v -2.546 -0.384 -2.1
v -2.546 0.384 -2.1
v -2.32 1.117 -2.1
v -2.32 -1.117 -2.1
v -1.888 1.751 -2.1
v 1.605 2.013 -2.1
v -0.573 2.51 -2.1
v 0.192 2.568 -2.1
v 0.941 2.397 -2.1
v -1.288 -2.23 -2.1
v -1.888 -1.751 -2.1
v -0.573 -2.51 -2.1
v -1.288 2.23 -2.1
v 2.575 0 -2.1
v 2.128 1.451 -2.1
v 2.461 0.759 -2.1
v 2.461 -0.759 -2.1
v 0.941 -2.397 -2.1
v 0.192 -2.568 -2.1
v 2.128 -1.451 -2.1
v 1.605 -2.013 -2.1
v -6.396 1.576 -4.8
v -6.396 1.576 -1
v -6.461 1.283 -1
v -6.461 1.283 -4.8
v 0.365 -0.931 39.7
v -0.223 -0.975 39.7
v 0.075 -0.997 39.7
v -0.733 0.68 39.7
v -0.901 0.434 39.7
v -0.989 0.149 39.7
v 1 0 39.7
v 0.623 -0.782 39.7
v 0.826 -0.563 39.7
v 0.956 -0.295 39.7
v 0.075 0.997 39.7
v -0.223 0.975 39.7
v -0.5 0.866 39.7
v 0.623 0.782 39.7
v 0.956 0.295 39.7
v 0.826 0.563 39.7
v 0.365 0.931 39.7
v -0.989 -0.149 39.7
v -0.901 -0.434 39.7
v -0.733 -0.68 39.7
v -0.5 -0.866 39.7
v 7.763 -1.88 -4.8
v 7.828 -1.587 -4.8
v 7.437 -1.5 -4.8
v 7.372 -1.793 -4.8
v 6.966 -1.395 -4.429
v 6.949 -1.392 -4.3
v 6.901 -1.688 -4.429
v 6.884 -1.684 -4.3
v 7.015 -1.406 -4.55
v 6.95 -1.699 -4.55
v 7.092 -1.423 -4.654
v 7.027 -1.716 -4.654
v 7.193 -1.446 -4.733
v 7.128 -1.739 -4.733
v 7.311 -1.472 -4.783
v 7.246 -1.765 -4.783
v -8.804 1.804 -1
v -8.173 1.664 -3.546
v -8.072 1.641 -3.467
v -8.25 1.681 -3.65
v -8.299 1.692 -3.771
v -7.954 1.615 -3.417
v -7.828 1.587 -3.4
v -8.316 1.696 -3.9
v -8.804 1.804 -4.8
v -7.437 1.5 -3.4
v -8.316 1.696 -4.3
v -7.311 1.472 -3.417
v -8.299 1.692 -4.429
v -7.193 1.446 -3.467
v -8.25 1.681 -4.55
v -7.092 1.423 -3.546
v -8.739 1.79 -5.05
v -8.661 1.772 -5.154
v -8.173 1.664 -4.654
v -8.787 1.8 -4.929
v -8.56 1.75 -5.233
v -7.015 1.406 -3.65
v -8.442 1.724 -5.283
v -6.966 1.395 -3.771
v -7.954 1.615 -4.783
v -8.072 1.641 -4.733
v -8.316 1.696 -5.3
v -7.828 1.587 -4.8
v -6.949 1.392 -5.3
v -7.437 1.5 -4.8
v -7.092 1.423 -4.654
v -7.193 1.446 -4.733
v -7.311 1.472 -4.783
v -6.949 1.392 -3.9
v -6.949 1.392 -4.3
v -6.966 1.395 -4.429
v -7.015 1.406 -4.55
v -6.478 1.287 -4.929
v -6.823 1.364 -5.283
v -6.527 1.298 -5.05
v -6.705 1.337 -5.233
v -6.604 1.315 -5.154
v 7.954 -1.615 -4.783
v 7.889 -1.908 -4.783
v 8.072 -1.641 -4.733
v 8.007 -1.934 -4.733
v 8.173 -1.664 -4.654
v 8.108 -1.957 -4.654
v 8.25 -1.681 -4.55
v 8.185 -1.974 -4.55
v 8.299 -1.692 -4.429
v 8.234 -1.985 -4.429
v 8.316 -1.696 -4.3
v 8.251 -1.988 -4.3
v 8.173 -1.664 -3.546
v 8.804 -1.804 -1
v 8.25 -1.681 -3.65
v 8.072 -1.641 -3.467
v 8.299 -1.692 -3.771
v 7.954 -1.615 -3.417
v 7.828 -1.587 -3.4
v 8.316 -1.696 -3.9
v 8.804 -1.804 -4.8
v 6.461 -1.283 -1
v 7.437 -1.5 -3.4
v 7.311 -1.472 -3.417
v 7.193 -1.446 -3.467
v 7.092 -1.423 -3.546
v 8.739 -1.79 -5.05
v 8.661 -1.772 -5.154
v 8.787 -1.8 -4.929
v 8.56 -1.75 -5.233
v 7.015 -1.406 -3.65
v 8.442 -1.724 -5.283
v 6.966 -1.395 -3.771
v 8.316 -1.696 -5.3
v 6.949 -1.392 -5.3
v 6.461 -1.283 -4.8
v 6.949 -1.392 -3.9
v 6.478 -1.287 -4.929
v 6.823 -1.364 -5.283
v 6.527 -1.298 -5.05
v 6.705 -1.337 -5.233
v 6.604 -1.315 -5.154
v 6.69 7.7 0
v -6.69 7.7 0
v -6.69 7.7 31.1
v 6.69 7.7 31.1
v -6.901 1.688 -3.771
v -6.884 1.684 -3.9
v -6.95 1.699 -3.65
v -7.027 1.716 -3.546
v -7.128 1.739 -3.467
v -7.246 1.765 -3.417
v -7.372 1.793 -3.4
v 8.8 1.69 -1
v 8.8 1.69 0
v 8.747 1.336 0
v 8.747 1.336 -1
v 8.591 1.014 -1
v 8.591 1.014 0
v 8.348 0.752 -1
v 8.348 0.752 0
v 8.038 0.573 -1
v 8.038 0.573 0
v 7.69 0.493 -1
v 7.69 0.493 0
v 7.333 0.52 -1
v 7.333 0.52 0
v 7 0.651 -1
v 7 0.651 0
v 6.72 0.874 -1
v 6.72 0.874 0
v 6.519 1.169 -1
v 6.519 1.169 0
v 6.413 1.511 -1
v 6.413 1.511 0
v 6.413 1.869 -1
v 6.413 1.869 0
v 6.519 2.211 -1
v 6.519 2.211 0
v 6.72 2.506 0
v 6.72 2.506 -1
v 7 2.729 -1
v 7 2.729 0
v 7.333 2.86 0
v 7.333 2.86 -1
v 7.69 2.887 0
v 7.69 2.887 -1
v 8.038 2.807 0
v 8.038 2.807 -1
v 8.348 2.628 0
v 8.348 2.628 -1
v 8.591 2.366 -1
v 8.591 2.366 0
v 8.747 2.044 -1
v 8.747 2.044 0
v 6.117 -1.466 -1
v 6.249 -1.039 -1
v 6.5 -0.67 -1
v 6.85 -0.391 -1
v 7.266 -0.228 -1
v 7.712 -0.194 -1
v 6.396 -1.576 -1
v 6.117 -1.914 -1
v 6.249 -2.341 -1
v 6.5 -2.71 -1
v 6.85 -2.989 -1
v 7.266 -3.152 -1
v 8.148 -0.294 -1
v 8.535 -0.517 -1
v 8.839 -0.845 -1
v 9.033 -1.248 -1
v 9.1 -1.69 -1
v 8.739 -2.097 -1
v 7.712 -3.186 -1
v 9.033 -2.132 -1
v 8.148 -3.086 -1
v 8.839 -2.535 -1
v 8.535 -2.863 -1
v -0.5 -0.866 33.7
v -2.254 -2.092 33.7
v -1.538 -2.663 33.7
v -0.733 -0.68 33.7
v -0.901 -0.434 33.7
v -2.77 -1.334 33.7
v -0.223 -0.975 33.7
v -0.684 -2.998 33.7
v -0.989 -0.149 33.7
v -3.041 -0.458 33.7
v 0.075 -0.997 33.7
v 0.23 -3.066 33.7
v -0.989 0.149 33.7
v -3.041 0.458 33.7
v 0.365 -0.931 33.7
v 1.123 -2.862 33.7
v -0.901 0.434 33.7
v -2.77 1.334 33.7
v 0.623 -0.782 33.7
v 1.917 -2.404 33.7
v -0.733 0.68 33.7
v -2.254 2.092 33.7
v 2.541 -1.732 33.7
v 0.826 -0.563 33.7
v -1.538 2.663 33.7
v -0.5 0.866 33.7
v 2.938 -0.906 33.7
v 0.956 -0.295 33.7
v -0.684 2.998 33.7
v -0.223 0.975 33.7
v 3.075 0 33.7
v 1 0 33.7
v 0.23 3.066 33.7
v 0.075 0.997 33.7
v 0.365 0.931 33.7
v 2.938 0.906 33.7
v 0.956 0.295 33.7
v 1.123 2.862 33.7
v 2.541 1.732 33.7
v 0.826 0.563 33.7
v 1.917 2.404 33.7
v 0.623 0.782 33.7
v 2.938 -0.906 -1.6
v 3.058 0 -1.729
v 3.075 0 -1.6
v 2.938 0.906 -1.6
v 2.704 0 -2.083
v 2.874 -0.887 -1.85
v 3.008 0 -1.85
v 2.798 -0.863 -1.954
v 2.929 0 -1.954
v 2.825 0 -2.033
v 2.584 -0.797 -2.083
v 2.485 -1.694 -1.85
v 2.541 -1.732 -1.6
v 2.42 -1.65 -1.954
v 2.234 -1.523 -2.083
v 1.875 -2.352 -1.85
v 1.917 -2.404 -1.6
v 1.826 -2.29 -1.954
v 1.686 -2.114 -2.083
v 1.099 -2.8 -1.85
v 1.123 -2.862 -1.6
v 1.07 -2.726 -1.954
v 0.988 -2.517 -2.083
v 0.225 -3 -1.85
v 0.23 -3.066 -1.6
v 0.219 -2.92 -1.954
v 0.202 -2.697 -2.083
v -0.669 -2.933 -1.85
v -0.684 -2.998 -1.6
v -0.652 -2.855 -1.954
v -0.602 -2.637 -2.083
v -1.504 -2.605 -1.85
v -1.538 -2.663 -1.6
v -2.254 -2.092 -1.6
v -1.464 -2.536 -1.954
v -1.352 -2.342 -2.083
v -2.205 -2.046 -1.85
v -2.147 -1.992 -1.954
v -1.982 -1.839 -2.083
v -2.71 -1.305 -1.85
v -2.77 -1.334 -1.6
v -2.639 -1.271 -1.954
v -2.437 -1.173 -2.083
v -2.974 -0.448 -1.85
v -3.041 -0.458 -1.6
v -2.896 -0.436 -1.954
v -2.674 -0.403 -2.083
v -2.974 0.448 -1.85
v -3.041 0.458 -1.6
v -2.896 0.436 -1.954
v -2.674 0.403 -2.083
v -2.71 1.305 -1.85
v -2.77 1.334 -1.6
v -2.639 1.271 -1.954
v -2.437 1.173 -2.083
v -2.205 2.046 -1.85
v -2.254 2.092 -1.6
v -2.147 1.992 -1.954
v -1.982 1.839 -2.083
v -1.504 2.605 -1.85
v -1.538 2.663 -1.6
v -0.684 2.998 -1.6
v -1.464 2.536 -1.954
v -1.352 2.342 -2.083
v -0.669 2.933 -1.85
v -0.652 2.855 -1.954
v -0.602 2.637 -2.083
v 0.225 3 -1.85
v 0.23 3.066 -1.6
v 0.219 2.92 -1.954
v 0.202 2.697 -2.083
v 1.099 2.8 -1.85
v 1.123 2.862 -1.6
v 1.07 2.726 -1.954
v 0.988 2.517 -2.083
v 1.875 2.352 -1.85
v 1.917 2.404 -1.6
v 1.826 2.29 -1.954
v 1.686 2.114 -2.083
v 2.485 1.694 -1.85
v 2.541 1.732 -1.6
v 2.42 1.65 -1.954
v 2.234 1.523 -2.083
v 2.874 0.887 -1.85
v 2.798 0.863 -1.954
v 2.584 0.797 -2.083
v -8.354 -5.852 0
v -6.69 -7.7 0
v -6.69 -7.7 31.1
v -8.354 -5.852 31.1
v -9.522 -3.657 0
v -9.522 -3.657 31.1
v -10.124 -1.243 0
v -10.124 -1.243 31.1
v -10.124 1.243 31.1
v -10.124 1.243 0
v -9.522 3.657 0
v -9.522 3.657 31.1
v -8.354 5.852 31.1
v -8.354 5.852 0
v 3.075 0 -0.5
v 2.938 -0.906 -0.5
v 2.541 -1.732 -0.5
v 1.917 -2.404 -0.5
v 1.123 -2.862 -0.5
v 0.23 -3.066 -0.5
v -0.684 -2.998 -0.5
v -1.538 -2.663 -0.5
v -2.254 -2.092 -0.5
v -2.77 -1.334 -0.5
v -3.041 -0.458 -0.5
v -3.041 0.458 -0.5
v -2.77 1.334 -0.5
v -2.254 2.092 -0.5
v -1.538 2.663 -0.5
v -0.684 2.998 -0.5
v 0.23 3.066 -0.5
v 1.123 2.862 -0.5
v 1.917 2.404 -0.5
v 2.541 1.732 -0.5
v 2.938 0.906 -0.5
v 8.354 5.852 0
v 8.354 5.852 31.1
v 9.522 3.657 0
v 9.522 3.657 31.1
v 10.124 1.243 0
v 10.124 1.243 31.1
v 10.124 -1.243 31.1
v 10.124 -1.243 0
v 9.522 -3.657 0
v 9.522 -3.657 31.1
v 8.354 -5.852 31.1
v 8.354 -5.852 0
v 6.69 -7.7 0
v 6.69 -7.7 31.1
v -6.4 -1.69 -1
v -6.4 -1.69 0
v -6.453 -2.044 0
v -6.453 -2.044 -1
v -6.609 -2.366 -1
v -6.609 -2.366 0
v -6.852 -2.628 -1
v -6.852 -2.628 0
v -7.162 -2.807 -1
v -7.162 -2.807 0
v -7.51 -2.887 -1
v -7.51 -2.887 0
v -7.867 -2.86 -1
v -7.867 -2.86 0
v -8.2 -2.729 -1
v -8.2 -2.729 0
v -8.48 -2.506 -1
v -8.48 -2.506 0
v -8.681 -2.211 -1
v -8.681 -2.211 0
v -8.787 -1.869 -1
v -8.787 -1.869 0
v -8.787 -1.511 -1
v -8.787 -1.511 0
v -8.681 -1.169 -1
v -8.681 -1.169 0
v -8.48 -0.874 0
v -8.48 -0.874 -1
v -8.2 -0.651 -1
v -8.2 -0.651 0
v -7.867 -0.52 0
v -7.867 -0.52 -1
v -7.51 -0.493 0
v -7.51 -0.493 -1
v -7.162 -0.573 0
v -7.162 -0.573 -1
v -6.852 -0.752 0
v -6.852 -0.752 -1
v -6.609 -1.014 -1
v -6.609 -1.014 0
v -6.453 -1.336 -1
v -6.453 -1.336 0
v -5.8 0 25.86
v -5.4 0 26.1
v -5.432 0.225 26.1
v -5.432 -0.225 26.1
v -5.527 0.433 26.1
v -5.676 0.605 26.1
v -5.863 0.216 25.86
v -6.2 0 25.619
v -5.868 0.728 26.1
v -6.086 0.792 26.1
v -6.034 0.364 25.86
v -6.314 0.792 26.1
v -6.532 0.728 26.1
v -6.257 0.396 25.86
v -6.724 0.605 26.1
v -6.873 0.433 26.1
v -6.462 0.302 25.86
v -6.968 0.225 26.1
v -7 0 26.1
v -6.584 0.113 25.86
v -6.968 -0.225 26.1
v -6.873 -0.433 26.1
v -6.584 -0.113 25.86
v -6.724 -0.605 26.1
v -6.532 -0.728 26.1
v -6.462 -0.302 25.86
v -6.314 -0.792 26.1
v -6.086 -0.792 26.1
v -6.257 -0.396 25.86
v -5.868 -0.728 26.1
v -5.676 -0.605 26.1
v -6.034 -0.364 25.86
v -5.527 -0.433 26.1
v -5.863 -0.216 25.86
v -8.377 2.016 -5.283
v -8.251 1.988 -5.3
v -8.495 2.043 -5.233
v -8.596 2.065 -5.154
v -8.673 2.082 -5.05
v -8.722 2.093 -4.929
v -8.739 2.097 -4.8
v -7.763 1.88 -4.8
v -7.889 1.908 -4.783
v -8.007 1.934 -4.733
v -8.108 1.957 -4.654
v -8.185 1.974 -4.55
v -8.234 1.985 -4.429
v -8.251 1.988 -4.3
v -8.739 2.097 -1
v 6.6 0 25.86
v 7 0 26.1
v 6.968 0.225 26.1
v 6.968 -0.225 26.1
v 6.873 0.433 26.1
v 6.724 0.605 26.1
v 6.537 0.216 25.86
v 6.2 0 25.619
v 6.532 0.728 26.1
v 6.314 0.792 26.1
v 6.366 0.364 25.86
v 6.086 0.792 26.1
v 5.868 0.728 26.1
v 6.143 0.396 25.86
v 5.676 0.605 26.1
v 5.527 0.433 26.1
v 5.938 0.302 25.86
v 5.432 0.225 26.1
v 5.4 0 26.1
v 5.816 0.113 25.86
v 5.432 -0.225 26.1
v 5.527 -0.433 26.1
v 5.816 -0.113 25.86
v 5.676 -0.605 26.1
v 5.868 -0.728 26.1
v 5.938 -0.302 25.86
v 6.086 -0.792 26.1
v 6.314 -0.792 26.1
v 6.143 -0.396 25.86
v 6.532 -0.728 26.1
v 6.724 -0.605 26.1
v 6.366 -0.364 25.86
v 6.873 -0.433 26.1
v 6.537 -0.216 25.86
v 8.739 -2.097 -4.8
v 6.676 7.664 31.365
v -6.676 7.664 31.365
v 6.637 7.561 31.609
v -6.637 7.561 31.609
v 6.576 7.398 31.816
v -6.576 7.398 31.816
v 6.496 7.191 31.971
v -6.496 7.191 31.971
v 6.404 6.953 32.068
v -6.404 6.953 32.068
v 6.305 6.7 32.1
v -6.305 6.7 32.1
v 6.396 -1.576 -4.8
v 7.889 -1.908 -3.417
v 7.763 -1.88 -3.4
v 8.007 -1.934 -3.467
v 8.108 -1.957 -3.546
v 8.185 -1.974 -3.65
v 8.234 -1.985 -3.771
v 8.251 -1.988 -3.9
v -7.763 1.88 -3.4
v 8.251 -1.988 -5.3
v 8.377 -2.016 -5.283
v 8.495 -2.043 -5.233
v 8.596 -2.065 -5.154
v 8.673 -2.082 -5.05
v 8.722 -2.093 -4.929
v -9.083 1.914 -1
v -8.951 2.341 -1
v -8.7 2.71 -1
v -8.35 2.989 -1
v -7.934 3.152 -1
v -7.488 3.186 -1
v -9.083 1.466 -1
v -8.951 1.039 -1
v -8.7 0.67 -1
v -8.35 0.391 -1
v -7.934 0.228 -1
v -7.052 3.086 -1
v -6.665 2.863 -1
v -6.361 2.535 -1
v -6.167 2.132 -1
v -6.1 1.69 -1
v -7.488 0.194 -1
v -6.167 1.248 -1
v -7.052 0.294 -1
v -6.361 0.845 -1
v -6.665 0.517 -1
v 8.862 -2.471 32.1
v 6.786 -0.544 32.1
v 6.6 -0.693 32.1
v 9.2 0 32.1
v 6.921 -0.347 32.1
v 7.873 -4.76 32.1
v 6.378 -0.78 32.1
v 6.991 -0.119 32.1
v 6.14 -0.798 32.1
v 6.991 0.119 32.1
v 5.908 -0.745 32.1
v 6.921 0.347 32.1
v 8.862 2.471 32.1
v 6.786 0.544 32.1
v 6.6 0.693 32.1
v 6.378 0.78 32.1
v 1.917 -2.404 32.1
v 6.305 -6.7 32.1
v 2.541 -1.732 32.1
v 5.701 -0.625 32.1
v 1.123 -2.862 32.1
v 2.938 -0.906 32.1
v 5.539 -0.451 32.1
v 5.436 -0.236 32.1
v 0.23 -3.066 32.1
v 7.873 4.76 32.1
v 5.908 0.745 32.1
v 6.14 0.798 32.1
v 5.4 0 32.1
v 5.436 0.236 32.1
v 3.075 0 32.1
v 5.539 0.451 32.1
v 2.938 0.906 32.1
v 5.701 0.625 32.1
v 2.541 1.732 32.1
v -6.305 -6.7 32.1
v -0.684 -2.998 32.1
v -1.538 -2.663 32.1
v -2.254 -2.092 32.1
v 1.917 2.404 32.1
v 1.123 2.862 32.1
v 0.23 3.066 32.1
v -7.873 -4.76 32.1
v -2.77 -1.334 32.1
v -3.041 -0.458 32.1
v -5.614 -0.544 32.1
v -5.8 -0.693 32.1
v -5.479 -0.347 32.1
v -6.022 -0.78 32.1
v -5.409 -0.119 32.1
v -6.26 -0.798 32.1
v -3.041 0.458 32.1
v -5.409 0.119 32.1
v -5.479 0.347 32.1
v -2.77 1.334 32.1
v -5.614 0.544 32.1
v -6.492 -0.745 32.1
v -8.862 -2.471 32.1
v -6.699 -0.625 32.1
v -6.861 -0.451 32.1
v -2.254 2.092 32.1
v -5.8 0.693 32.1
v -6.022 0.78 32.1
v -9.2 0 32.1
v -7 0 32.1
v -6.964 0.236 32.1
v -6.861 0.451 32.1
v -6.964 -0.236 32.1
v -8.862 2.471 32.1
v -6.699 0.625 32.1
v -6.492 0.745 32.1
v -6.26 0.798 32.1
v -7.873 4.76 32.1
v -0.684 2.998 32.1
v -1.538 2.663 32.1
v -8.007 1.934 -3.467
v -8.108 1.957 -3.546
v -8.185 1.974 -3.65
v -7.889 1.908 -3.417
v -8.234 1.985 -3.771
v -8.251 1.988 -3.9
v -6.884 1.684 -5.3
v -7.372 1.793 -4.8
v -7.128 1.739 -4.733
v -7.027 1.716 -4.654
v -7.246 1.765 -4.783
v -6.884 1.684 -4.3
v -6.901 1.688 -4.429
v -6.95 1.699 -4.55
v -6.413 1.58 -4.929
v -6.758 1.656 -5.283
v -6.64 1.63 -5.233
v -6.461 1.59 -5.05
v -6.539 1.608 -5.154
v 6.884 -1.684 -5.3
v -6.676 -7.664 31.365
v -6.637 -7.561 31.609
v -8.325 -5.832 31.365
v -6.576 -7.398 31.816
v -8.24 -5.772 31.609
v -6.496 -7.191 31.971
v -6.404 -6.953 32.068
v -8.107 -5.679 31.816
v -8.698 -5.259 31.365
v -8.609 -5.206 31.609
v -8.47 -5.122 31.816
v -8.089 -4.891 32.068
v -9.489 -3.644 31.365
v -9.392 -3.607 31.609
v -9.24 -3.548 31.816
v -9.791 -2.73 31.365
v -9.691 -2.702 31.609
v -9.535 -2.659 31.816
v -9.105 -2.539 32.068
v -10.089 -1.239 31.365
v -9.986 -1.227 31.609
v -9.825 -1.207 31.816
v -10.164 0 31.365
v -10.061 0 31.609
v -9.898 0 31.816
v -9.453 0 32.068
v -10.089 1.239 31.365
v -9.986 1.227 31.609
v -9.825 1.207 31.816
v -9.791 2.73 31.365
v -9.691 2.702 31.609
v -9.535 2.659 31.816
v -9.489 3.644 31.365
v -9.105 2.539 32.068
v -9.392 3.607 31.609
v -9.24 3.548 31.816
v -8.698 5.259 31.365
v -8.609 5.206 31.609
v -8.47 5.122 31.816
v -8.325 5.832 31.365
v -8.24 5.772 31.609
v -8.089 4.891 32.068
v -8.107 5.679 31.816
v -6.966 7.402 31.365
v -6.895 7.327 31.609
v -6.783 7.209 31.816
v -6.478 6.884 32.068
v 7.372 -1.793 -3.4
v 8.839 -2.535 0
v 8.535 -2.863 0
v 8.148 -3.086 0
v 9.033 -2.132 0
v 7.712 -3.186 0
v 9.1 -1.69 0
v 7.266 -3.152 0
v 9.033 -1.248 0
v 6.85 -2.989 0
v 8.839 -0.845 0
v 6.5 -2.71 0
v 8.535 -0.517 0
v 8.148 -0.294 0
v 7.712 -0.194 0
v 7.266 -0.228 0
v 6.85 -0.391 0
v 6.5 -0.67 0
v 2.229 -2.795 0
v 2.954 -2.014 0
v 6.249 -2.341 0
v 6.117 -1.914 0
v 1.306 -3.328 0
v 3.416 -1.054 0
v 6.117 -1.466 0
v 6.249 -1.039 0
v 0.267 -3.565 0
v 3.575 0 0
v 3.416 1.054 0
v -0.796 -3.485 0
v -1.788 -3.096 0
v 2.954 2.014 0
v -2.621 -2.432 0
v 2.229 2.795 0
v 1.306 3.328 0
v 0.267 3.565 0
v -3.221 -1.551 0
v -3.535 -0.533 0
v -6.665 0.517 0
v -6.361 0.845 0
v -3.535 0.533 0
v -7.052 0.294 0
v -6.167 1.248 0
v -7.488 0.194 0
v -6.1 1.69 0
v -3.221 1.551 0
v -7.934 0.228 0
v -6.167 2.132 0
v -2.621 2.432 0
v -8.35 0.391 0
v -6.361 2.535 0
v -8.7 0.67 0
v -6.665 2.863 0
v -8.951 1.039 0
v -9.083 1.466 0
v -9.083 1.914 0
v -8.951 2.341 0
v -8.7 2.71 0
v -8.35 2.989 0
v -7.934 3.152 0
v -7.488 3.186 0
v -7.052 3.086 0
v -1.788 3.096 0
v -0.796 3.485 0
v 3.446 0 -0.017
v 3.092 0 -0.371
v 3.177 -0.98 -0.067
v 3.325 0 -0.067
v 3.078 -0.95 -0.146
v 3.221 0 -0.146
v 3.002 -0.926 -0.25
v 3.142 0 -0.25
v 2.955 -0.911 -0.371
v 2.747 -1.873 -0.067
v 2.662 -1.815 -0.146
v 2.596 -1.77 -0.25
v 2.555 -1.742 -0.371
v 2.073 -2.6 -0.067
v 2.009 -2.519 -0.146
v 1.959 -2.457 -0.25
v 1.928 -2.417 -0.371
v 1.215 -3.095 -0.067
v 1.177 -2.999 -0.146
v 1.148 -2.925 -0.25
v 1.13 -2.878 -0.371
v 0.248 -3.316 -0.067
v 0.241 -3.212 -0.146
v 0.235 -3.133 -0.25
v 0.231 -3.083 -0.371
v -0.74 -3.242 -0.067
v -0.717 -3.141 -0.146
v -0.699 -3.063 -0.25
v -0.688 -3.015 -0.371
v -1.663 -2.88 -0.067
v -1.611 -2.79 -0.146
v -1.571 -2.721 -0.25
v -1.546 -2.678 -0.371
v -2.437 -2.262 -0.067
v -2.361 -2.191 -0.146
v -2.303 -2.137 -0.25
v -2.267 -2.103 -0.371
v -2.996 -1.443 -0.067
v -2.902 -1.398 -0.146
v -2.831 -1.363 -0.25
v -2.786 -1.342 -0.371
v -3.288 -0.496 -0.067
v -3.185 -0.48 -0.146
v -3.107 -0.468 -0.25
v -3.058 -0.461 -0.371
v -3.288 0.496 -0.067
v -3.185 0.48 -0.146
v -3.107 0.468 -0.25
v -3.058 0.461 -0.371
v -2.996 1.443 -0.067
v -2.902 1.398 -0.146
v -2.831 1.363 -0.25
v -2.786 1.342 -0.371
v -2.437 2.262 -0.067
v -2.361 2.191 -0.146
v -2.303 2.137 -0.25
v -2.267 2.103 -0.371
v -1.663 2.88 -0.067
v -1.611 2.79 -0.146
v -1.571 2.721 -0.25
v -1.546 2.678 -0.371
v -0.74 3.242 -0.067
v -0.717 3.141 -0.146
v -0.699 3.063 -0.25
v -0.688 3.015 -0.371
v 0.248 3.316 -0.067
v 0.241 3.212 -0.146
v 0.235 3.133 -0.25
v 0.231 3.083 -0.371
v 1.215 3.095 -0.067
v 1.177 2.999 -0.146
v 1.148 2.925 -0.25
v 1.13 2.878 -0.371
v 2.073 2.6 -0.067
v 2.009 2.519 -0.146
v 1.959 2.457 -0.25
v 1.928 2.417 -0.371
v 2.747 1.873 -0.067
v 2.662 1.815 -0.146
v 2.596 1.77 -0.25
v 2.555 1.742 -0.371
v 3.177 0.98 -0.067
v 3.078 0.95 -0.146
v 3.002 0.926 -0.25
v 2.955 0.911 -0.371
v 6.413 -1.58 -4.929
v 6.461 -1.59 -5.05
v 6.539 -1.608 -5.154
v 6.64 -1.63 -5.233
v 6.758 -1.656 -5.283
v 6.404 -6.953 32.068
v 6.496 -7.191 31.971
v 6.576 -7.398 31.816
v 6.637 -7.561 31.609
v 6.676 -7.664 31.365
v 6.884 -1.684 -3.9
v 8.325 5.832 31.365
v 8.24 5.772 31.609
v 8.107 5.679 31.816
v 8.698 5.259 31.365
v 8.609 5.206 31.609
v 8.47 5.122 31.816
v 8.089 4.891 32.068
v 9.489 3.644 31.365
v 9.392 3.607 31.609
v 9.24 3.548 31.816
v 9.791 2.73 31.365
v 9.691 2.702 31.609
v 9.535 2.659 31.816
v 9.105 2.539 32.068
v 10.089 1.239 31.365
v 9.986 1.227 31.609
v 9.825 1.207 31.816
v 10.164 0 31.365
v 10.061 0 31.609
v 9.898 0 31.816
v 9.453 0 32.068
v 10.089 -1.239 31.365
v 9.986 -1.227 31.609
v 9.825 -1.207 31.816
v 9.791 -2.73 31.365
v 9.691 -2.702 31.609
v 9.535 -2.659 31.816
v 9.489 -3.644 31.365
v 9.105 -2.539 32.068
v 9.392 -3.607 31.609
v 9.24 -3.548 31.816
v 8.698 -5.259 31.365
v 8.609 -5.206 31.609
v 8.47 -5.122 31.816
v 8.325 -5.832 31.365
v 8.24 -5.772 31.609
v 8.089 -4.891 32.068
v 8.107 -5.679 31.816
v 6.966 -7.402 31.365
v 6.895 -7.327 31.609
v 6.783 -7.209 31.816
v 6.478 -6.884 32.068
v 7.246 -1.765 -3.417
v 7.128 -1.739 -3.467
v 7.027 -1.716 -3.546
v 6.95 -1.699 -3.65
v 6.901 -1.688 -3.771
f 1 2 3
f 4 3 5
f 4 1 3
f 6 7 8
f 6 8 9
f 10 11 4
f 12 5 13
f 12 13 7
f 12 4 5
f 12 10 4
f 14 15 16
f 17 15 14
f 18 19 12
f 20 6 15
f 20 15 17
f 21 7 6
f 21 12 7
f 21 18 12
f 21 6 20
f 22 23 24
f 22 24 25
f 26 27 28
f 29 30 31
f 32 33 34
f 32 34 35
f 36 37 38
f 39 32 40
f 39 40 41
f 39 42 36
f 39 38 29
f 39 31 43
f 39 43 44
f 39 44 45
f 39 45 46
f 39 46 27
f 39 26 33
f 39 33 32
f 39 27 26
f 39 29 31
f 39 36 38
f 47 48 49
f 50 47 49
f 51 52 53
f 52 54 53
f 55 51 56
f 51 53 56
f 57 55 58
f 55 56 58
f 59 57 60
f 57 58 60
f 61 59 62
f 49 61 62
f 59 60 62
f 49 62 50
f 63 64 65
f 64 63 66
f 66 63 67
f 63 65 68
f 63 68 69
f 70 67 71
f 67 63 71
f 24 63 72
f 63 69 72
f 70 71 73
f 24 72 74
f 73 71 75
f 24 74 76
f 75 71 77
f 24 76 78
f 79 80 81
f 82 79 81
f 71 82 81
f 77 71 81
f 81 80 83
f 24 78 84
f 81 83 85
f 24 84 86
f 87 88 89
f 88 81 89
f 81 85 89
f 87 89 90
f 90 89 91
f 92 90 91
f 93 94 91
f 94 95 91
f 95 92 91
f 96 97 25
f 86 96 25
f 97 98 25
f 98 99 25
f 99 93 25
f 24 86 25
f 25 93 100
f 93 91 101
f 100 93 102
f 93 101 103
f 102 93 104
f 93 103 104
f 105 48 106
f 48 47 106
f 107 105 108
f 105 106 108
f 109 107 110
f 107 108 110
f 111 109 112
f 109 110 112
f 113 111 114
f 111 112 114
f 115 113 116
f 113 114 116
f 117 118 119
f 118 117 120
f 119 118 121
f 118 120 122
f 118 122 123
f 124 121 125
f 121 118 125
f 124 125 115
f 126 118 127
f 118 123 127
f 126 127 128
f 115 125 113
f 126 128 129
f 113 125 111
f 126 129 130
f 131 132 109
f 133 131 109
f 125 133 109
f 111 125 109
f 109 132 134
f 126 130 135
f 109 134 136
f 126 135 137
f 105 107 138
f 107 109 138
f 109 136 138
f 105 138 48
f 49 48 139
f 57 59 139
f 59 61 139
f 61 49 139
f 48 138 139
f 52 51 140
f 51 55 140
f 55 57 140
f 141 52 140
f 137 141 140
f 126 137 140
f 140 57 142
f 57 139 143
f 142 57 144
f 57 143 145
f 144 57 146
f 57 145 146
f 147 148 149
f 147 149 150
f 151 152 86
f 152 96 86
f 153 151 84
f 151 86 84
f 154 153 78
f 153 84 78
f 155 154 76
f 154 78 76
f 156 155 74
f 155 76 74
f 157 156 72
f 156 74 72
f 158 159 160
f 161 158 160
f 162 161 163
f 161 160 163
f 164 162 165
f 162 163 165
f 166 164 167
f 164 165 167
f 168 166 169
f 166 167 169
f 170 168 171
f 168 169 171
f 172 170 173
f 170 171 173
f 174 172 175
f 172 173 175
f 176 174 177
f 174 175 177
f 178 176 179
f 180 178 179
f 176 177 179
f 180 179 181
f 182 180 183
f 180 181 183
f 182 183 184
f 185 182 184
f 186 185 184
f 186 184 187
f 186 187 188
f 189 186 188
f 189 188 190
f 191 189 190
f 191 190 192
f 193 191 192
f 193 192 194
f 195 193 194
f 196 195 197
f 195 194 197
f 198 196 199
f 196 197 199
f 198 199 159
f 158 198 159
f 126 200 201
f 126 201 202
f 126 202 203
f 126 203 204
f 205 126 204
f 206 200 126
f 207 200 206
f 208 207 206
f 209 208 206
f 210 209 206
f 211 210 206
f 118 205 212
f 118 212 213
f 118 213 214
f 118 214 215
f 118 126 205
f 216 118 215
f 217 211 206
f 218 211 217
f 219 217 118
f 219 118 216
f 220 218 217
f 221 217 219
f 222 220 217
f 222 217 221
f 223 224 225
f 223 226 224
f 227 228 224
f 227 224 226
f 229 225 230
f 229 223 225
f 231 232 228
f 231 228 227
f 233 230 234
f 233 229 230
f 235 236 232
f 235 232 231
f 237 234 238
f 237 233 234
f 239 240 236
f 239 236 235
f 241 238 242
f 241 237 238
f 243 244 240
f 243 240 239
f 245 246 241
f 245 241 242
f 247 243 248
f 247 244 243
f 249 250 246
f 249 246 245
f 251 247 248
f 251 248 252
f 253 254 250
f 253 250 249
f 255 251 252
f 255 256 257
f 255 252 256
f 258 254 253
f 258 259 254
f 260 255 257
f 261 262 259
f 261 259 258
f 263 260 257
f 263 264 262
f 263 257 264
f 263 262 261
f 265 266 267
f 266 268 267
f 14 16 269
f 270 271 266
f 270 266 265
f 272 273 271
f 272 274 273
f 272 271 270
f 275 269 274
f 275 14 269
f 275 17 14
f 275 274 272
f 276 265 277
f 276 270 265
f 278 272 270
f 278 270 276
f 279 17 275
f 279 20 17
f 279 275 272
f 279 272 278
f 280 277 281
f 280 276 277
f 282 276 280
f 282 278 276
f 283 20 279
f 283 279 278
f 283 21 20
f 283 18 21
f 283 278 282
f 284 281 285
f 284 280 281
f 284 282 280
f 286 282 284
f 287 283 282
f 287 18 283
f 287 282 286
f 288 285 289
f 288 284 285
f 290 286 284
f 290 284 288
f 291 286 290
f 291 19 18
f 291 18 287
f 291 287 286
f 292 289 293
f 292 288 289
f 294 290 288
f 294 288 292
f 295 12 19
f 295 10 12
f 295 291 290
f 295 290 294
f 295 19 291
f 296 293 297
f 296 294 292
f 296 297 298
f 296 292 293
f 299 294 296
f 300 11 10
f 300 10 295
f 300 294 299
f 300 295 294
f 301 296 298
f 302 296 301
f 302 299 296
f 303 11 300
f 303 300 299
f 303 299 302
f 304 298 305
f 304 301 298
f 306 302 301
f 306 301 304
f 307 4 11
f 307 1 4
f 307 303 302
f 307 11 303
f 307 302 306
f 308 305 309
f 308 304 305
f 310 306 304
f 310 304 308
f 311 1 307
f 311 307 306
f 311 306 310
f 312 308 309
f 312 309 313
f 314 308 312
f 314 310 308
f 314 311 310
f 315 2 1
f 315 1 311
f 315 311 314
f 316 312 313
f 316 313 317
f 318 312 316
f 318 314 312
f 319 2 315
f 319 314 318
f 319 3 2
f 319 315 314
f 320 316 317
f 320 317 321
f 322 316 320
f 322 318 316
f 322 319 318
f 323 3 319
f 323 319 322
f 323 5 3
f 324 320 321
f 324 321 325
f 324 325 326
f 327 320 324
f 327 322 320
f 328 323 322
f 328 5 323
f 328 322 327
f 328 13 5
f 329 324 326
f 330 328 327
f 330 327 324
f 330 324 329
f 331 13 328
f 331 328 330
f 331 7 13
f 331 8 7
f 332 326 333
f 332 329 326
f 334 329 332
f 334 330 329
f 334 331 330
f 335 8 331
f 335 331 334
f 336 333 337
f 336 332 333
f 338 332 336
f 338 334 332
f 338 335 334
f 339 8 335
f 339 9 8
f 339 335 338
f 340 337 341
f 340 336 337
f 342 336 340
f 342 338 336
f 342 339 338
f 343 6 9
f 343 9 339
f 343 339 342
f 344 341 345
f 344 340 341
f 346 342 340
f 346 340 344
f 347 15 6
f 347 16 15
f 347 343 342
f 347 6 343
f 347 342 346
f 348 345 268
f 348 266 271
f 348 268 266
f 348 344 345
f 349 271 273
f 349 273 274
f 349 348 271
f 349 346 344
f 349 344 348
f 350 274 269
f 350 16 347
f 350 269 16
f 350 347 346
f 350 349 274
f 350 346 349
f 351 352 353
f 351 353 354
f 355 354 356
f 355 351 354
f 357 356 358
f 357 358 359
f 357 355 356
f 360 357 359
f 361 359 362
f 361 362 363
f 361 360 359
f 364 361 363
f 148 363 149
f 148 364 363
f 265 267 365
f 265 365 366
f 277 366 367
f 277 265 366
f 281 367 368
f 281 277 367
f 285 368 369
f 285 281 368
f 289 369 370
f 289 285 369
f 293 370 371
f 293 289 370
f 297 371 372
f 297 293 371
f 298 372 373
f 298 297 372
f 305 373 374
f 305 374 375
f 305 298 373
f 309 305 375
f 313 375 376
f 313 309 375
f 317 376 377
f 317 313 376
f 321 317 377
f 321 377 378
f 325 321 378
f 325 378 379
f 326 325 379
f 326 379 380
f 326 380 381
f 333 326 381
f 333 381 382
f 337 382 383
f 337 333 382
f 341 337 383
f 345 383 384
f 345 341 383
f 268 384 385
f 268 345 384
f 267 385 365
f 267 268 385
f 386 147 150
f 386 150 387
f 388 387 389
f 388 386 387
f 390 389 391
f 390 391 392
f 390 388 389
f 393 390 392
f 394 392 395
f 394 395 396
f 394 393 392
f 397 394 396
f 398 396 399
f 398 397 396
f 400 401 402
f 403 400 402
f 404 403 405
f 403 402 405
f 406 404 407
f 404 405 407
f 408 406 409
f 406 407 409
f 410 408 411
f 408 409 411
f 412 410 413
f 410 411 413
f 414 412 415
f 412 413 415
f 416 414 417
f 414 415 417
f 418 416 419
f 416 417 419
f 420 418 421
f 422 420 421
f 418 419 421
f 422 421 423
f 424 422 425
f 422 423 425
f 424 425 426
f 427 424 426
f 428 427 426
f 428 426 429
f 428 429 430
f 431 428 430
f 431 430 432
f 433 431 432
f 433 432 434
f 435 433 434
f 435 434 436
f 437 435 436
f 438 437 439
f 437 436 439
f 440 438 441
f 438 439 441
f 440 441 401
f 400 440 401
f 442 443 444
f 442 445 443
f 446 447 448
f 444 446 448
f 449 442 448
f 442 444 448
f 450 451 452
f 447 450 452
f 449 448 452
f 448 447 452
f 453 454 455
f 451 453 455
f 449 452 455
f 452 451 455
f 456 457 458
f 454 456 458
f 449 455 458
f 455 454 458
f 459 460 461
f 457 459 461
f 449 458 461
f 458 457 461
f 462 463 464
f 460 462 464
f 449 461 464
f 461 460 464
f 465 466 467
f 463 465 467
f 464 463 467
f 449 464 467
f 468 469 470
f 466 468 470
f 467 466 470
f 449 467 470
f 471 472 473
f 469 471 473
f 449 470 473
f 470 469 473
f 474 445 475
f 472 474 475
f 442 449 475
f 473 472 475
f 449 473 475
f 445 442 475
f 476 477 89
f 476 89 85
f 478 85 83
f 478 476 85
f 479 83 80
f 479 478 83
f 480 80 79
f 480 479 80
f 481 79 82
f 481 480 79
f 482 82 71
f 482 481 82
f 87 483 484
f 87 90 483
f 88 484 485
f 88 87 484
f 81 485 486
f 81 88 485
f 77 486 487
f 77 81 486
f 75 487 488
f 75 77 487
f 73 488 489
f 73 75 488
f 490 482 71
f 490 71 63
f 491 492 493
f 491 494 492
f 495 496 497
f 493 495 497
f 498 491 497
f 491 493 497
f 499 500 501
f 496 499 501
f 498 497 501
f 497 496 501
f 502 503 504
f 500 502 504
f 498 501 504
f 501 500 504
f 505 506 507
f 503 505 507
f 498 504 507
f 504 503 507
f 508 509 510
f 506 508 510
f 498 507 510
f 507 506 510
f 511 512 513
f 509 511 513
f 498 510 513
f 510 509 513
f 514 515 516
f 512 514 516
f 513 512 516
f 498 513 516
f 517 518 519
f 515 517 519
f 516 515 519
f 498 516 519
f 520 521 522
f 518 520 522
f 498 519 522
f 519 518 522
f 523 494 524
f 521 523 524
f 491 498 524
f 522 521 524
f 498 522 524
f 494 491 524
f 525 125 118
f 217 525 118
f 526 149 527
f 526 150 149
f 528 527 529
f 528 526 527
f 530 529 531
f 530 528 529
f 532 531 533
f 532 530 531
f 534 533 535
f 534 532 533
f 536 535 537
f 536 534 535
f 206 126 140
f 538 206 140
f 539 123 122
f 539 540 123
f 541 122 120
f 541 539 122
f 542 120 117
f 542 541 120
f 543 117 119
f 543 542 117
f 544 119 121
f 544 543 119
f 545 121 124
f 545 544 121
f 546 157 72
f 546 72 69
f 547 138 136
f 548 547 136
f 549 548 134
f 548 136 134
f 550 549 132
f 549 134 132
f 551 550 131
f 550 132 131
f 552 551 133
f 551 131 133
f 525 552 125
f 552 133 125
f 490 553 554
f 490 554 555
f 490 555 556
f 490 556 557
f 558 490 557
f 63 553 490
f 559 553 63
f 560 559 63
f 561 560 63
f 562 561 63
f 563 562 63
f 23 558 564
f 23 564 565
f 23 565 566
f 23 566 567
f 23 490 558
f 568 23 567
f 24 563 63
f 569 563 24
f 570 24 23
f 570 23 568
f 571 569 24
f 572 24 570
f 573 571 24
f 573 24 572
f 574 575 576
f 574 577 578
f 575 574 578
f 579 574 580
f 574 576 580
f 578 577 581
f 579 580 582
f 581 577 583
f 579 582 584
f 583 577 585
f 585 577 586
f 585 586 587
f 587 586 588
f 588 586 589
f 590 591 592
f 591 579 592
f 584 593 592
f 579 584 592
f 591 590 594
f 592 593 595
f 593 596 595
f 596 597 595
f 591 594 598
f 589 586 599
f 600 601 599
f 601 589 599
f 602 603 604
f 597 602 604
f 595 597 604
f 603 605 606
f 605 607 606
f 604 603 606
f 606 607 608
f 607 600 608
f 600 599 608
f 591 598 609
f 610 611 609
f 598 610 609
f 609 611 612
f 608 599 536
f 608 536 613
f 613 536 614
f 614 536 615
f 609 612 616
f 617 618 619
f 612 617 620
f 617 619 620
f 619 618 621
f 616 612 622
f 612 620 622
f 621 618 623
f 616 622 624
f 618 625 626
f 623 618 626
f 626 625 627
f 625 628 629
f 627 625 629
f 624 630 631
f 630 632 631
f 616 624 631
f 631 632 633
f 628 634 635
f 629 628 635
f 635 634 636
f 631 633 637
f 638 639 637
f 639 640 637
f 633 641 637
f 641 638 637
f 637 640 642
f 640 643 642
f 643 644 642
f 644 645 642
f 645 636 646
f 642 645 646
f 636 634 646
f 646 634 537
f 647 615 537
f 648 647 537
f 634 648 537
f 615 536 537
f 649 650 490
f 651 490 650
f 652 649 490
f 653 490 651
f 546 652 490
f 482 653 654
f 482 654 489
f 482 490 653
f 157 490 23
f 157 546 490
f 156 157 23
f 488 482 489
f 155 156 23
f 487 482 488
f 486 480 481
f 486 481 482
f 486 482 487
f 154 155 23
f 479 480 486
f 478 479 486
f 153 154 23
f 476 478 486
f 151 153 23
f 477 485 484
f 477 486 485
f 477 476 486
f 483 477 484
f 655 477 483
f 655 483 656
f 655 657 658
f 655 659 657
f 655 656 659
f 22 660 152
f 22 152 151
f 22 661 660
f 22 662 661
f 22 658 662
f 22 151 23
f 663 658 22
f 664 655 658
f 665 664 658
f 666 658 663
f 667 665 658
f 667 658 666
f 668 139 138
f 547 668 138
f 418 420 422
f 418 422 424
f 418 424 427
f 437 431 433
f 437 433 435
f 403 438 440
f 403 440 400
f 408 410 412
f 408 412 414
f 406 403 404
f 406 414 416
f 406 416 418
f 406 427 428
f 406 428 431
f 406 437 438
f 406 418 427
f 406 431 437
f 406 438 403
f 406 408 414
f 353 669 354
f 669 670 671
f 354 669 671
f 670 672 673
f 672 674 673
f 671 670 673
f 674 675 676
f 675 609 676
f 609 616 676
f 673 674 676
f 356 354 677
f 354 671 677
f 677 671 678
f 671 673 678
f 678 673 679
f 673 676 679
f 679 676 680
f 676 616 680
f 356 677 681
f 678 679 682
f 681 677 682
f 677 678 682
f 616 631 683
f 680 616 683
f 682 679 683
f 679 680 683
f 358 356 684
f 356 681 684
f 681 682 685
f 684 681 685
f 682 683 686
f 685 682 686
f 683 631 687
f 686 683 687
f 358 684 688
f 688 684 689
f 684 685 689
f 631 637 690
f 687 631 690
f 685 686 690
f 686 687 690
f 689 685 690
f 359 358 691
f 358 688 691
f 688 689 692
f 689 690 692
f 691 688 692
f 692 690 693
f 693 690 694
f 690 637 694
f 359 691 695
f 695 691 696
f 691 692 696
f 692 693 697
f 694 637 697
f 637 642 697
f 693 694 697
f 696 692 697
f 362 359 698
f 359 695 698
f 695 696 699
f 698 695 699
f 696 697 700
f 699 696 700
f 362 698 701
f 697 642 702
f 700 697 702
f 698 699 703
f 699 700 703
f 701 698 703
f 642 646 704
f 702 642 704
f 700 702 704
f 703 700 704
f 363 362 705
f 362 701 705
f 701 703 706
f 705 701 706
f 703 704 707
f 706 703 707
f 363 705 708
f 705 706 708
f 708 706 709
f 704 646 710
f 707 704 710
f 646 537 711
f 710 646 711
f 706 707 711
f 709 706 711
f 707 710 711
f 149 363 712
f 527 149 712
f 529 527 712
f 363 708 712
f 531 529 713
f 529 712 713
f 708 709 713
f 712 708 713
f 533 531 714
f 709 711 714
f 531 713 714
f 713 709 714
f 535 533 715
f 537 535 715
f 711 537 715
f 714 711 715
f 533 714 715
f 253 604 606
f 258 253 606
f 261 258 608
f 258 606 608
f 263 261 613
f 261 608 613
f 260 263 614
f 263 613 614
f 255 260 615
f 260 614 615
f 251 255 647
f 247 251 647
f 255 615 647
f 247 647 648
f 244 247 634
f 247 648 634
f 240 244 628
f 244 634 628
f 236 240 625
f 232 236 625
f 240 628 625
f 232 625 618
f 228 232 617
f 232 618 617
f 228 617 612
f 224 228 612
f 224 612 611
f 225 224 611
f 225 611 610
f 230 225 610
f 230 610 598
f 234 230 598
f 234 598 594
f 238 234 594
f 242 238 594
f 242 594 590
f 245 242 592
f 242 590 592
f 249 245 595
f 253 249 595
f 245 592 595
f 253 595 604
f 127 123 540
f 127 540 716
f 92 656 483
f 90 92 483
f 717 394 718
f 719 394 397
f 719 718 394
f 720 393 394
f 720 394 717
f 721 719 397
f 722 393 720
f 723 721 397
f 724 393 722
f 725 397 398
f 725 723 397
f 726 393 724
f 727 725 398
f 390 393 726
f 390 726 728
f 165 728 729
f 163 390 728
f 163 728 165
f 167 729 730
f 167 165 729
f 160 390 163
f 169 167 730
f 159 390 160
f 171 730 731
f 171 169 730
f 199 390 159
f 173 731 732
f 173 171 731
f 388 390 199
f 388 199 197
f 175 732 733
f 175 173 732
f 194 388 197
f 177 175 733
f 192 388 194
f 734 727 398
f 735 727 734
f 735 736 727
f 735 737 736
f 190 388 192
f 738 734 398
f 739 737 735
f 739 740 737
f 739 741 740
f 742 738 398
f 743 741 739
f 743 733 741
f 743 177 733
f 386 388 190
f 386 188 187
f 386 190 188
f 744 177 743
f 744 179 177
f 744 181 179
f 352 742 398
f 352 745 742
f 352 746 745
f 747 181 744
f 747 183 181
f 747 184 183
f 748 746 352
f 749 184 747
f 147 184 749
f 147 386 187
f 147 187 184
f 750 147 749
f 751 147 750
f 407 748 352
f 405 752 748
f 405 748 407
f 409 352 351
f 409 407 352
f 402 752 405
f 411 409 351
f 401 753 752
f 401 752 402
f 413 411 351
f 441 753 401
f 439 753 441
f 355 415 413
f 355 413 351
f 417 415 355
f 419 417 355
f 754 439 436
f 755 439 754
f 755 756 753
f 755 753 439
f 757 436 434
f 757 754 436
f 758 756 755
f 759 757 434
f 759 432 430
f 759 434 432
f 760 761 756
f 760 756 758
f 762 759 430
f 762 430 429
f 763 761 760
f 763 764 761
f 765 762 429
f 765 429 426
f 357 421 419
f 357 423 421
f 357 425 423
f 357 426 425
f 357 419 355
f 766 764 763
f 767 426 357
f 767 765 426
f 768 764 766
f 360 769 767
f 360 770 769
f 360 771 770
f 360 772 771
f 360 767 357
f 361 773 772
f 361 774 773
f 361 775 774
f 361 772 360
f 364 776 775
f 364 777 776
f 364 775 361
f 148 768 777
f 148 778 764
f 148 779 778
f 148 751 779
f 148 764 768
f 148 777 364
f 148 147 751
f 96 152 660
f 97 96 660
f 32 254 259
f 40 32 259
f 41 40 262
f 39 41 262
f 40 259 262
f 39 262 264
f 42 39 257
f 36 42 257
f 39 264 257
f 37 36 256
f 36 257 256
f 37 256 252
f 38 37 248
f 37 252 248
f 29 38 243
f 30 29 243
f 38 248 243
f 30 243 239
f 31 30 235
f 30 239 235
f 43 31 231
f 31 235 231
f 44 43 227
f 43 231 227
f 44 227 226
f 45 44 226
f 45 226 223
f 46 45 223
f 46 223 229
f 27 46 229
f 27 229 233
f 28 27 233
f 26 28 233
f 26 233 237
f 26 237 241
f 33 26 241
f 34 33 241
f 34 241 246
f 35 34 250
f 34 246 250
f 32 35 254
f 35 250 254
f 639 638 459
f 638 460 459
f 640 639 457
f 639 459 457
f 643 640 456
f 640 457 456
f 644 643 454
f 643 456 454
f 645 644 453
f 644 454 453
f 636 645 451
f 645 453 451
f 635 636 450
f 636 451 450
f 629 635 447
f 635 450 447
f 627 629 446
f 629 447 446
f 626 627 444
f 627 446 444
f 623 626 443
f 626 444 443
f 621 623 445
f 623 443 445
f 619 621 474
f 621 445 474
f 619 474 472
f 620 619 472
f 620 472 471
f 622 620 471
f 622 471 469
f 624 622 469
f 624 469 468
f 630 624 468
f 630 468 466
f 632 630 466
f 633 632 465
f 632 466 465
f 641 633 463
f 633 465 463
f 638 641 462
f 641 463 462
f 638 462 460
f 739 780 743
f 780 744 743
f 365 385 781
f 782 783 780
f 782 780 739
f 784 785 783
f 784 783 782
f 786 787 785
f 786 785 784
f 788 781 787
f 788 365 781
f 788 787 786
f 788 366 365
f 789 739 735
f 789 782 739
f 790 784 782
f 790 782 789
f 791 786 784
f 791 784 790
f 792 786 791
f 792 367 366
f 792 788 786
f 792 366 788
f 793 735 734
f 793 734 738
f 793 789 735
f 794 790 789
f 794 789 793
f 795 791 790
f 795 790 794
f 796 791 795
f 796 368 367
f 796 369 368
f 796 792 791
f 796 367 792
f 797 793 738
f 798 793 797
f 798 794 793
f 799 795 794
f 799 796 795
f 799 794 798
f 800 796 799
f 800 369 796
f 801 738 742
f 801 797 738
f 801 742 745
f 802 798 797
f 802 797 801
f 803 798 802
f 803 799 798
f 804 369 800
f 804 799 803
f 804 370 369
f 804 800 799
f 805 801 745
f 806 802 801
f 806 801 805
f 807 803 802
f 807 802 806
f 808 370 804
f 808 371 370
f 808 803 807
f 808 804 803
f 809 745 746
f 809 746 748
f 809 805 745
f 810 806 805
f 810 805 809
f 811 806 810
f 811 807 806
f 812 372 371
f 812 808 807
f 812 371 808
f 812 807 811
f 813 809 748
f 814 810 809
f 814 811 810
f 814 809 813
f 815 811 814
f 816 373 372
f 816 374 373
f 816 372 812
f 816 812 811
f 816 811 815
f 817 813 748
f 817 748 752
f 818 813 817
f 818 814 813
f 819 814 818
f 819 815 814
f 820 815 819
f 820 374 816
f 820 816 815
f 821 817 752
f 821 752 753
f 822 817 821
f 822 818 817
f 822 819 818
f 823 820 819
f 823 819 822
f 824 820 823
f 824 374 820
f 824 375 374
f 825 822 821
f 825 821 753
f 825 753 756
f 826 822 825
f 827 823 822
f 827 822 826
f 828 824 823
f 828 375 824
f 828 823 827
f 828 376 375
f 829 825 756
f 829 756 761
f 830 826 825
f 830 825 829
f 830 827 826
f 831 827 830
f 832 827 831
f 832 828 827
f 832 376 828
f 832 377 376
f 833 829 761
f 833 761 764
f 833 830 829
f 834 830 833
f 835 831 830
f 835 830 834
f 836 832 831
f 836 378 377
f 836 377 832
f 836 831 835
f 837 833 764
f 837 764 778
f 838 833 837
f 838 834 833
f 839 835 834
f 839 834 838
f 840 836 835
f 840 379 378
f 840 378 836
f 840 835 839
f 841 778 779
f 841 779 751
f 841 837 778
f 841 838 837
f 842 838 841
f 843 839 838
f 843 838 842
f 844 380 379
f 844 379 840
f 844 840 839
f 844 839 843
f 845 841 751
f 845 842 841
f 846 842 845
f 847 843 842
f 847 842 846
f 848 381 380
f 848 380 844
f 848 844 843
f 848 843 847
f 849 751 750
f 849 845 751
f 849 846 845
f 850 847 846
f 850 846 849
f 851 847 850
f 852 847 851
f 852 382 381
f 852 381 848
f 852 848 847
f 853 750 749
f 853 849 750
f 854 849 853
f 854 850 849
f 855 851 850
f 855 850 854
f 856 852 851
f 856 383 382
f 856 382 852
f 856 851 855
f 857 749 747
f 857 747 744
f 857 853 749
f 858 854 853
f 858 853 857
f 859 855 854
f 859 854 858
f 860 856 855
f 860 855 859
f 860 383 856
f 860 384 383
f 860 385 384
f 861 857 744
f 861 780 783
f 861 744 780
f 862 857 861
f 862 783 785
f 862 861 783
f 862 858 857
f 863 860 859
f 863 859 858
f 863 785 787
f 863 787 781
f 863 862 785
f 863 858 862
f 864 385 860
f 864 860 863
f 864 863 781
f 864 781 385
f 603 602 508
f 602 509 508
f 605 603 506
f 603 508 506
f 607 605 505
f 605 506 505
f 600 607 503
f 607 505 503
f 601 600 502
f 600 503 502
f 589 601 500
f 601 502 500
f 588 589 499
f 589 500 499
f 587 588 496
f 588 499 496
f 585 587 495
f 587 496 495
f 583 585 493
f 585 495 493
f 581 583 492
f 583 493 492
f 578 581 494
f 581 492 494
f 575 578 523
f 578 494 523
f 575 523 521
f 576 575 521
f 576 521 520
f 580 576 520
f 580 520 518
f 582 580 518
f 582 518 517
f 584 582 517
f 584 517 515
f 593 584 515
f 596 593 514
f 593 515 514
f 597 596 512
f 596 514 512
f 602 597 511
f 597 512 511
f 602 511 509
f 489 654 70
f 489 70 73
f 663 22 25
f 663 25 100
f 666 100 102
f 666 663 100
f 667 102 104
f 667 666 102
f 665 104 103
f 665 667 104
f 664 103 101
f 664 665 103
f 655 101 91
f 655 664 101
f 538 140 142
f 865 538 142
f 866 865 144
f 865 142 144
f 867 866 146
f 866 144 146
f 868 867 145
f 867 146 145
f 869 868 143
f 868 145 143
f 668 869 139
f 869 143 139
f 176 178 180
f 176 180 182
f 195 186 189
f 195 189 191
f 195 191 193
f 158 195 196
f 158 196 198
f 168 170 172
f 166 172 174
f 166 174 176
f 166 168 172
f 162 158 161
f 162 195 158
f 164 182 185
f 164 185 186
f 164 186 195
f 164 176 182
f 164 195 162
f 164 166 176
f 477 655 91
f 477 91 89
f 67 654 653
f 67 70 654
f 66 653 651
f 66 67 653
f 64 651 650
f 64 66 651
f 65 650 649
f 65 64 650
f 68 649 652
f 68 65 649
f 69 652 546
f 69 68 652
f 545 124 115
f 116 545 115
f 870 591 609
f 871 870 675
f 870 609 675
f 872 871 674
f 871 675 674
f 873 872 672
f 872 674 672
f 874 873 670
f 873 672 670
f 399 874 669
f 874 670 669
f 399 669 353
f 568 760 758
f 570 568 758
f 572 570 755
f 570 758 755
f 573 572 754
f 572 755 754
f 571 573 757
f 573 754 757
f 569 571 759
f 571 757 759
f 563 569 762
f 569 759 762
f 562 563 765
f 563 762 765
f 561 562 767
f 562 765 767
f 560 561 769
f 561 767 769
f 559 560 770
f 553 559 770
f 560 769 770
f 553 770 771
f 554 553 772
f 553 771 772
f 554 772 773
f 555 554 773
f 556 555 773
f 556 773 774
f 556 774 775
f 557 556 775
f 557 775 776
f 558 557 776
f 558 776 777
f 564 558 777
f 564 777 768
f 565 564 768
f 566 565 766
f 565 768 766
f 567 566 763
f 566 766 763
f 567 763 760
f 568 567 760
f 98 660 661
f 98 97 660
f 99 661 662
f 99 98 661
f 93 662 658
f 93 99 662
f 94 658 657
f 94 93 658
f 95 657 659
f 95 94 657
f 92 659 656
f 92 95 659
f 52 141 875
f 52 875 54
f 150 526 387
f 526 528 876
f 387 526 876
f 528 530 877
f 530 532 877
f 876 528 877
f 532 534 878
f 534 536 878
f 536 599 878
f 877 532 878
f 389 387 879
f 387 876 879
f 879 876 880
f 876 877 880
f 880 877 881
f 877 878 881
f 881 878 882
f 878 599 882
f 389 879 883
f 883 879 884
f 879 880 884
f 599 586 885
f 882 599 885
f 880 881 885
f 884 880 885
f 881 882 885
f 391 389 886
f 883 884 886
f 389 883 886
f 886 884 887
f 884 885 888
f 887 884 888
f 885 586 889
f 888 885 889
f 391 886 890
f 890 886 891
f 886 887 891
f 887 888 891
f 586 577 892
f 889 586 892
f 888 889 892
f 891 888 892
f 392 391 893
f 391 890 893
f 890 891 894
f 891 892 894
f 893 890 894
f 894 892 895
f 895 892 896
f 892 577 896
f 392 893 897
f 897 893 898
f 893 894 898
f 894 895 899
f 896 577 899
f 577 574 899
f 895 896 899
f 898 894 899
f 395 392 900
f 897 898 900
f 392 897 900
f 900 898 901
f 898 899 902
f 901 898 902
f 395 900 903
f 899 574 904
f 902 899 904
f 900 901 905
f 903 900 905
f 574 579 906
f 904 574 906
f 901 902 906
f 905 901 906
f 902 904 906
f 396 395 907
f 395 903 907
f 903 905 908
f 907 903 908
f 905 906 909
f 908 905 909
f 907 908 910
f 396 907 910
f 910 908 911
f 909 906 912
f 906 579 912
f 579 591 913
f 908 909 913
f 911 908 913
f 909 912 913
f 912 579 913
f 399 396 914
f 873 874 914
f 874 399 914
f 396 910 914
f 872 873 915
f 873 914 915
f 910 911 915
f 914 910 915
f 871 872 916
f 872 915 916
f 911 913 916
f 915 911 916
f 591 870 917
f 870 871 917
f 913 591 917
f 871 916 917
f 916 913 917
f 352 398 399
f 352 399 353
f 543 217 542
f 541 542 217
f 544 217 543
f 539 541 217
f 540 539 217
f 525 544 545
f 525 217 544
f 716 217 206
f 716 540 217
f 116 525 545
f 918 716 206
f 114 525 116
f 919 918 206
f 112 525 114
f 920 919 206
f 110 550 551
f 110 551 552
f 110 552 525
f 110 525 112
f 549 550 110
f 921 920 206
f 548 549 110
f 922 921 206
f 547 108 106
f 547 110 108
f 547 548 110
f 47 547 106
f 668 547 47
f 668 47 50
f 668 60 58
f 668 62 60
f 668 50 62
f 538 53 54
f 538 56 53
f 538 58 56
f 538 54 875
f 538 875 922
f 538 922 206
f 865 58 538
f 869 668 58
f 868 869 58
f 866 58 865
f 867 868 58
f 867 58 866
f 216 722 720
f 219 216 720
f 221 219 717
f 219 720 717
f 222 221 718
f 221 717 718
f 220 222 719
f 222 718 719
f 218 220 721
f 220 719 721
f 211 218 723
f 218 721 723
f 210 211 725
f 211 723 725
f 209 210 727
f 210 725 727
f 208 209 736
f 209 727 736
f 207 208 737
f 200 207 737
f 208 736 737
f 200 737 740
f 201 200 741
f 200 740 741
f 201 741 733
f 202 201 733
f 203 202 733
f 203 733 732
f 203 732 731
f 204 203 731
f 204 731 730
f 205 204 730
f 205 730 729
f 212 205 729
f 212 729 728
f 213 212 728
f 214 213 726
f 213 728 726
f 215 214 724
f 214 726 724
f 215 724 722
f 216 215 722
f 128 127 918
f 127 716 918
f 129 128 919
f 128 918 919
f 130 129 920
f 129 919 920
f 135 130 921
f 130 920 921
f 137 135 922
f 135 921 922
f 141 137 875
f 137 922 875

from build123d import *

# Parameters (mm, degrees)
BOSS_EXTRUDE1_DEPTH      = 32.1
SKETCH2_R                = 3.075
BOSS_EXTRUDE2_DEPTH      = 1.6
BOSS_EXTRUDE3_START      = 2.1
SKETCH3_R                = 3.075
BOSS_EXTRUDE3_DEPTH      = 2.1
M2_TAPPED_HOLE1_D        = 1.6
M2_TAPPED_HOLE1_DEPTH    = 6
M2_TAPPED_HOLE1_TIP      = 0.480688495
SKETCH6_R                = 1.2
SKETCH6_R_2              = 1.5
BOSS_EXTRUDE4_DEPTH      = 1
SKETCH7_R                = 1
BOSS_EXTRUDE5_DEPTH      = 6
FILLET1_R                = 1
FILLET2_R                = 0.5
BOSS_EXTRUDE6_DEPTH      = 0.15
BOSS_EXTRUDE6_DEPTH_BACK = 0.15
SKETCH9_W                = 1.4
SKETCH9_H                = 1.4
FILLET3_R                = 0.5


with BuildPart() as part:
    # Sketch1 → Boss-Extrude1 (new body)
    with BuildSketch(Plane.XY):
        with BuildLine():
            Line((-6.68954408, 7.7), (6.68954408, 7.7))
            ThreePointArc((6.68954408, 7.7), (10.2, 0), (6.68954408, -7.7))
            Line((6.68954408, -7.7), (-6.68954408, -7.7))
            ThreePointArc((-6.68954408, -7.7), (-10.2, 0), (-6.68954408, 7.7))
        make_face()
    extrude(amount=BOSS_EXTRUDE1_DEPTH)

    # Sketch2 → Boss-Extrude2 (add)
    with BuildSketch(Plane.XY.offset(32.1)):
        Circle(SKETCH2_R)
    extrude(amount=BOSS_EXTRUDE2_DEPTH)

    # Sketch3 → Boss-Extrude3 (add)
    with BuildSketch(Plane(origin=(0, 0, 0), x_dir=(-1, 0, 0), z_dir=(0, 0, -1)).offset(BOSS_EXTRUDE3_START)):
        Circle(SKETCH3_R)
    extrude(amount=-BOSS_EXTRUDE3_DEPTH)

    # M2 Tapped Hole1
    with Locations(Plane.XY.offset(32.1)):
        with Locations((-6.2, 0), (6.2, 0)):
            Hole(M2_TAPPED_HOLE1_D / 2, depth=M2_TAPPED_HOLE1_DEPTH)
            with Locations((0, 0, -(M2_TAPPED_HOLE1_DEPTH + M2_TAPPED_HOLE1_TIP / 2))):  # 118° drill point
                Cone(0, M2_TAPPED_HOLE1_D / 2, M2_TAPPED_HOLE1_TIP, mode=Mode.SUBTRACT)

    # Sketch6 → Boss-Extrude4 (add)
    with BuildSketch(Plane(origin=(0, 0, 0), x_dir=(-1, 0, 0), z_dir=(0, 0, -1))):
        with Locations((-7.6, 1.69)):
            Circle(SKETCH6_R)
        with Locations((7.6, -1.69)):
            Circle(SKETCH6_R)
        with Locations((-7.6, -1.69)):
            Circle(SKETCH6_R_2)
        with Locations((7.6, 1.69)):
            Circle(SKETCH6_R_2)
    extrude(amount=BOSS_EXTRUDE4_DEPTH)

    # Sketch7 → Boss-Extrude5 (add)
    with BuildSketch(Plane.XY.offset(33.7)):
        Circle(SKETCH7_R)
    extrude(amount=BOSS_EXTRUDE5_DEPTH)

    # Fillet1
    fillet1_edges = [part.edges().sort_by_distance(p)[0] for p in [
        (0, -7.7, 32.1),
        (10.2, 0, 32.1),
        (0, 7.7, 32.1),
        (-10.2, 0, 32.1),
    ]]
    fillet(fillet1_edges, radius=FILLET1_R)

    # Fillet2
    fillet2_edges = [part.edges().sort_by_distance(p)[0] for p in [
        (3.075, 0, 0),
        (3.075, 0, -2.1),
    ]]
    fillet(fillet2_edges, radius=FILLET2_R)

    # Sketch9 → Boss-Extrude6 (add, two sides: drawn at the far end of the back side and taken through both)
    # profile 1 of 2: a face of its own
    with BuildSketch(Plane(origin=(0, 0, 0), x_dir=(-0.9761568291371078, 0.2170664527949621, 0), z_dir=(-0.21706645279496206, -0.9761568291371077, 0)).offset(-BOSS_EXTRUDE6_DEPTH_BACK)):
        with BuildLine():
            Line((-8.985634207, 1), (-6.585634207, 1))
            Line((-6.585634207, 1), (-6.585634207, 4.8))
            ThreePointArc((-6.585634207, 4.8), (-6.732080816, 5.153553391), (-7.085634207, 5.3))
            Line((-7.085634207, 5.3), (-8.485634207, 5.3))
            ThreePointArc((-8.485634207, 5.3), (-8.839187597, 5.153553391), (-8.985634207, 4.8))
            Line((-8.985634207, 4.8), (-8.985634207, 1))
        make_face()
        with Locations((-7.785634207, 4.1)):
            Rectangle(SKETCH9_W, SKETCH9_H, mode=Mode.SUBTRACT)
    # profile 2 of 2: a face of its own
    with BuildSketch(Plane(origin=(0, 0, 0), x_dir=(-0.9761568291371078, 0.2170664527949621, 0), z_dir=(-0.21706645279496206, -0.9761568291371077, 0)).offset(-BOSS_EXTRUDE6_DEPTH_BACK)):
        with BuildLine():
            Line((8.985634207, 1), (6.585634207, 1))
            Line((6.585634207, 1), (6.585634207, 4.8))
            ThreePointArc((6.585634207, 4.8), (6.732080816, 5.153553391), (7.085634207, 5.3))
            Line((7.085634207, 5.3), (8.485634207, 5.3))
            ThreePointArc((8.485634207, 5.3), (8.839187597, 5.153553391), (8.985634207, 4.8))
            Line((8.985634207, 4.8), (8.985634207, 1))
        make_face()
        with Locations((7.785634207, 4.1)):
            Rectangle(SKETCH9_W, SKETCH9_H, mode=Mode.SUBTRACT)
    extrude(amount=BOSS_EXTRUDE6_DEPTH + BOSS_EXTRUDE6_DEPTH_BACK)

    # Fillet3
    fillet3_edges = [part.edges().sort_by_distance(p)[0] for p in [
        (-6.91669022, 1.538053483, -3.4),
        (-6.91669022, 1.538053483, -4.8),
        (-8.28330978, 1.841946517, -4.8),
        (-8.28330978, 1.841946517, -3.4),
        (8.28330978, -1.841946517, -3.4),
        (8.28330978, -1.841946517, -4.8),
        (6.91669022, -1.538053483, -4.8),
        (6.91669022, -1.538053483, -3.4),
    ]]
    fillet(fillet3_edges, radius=FILLET3_R)


solid = part.part
